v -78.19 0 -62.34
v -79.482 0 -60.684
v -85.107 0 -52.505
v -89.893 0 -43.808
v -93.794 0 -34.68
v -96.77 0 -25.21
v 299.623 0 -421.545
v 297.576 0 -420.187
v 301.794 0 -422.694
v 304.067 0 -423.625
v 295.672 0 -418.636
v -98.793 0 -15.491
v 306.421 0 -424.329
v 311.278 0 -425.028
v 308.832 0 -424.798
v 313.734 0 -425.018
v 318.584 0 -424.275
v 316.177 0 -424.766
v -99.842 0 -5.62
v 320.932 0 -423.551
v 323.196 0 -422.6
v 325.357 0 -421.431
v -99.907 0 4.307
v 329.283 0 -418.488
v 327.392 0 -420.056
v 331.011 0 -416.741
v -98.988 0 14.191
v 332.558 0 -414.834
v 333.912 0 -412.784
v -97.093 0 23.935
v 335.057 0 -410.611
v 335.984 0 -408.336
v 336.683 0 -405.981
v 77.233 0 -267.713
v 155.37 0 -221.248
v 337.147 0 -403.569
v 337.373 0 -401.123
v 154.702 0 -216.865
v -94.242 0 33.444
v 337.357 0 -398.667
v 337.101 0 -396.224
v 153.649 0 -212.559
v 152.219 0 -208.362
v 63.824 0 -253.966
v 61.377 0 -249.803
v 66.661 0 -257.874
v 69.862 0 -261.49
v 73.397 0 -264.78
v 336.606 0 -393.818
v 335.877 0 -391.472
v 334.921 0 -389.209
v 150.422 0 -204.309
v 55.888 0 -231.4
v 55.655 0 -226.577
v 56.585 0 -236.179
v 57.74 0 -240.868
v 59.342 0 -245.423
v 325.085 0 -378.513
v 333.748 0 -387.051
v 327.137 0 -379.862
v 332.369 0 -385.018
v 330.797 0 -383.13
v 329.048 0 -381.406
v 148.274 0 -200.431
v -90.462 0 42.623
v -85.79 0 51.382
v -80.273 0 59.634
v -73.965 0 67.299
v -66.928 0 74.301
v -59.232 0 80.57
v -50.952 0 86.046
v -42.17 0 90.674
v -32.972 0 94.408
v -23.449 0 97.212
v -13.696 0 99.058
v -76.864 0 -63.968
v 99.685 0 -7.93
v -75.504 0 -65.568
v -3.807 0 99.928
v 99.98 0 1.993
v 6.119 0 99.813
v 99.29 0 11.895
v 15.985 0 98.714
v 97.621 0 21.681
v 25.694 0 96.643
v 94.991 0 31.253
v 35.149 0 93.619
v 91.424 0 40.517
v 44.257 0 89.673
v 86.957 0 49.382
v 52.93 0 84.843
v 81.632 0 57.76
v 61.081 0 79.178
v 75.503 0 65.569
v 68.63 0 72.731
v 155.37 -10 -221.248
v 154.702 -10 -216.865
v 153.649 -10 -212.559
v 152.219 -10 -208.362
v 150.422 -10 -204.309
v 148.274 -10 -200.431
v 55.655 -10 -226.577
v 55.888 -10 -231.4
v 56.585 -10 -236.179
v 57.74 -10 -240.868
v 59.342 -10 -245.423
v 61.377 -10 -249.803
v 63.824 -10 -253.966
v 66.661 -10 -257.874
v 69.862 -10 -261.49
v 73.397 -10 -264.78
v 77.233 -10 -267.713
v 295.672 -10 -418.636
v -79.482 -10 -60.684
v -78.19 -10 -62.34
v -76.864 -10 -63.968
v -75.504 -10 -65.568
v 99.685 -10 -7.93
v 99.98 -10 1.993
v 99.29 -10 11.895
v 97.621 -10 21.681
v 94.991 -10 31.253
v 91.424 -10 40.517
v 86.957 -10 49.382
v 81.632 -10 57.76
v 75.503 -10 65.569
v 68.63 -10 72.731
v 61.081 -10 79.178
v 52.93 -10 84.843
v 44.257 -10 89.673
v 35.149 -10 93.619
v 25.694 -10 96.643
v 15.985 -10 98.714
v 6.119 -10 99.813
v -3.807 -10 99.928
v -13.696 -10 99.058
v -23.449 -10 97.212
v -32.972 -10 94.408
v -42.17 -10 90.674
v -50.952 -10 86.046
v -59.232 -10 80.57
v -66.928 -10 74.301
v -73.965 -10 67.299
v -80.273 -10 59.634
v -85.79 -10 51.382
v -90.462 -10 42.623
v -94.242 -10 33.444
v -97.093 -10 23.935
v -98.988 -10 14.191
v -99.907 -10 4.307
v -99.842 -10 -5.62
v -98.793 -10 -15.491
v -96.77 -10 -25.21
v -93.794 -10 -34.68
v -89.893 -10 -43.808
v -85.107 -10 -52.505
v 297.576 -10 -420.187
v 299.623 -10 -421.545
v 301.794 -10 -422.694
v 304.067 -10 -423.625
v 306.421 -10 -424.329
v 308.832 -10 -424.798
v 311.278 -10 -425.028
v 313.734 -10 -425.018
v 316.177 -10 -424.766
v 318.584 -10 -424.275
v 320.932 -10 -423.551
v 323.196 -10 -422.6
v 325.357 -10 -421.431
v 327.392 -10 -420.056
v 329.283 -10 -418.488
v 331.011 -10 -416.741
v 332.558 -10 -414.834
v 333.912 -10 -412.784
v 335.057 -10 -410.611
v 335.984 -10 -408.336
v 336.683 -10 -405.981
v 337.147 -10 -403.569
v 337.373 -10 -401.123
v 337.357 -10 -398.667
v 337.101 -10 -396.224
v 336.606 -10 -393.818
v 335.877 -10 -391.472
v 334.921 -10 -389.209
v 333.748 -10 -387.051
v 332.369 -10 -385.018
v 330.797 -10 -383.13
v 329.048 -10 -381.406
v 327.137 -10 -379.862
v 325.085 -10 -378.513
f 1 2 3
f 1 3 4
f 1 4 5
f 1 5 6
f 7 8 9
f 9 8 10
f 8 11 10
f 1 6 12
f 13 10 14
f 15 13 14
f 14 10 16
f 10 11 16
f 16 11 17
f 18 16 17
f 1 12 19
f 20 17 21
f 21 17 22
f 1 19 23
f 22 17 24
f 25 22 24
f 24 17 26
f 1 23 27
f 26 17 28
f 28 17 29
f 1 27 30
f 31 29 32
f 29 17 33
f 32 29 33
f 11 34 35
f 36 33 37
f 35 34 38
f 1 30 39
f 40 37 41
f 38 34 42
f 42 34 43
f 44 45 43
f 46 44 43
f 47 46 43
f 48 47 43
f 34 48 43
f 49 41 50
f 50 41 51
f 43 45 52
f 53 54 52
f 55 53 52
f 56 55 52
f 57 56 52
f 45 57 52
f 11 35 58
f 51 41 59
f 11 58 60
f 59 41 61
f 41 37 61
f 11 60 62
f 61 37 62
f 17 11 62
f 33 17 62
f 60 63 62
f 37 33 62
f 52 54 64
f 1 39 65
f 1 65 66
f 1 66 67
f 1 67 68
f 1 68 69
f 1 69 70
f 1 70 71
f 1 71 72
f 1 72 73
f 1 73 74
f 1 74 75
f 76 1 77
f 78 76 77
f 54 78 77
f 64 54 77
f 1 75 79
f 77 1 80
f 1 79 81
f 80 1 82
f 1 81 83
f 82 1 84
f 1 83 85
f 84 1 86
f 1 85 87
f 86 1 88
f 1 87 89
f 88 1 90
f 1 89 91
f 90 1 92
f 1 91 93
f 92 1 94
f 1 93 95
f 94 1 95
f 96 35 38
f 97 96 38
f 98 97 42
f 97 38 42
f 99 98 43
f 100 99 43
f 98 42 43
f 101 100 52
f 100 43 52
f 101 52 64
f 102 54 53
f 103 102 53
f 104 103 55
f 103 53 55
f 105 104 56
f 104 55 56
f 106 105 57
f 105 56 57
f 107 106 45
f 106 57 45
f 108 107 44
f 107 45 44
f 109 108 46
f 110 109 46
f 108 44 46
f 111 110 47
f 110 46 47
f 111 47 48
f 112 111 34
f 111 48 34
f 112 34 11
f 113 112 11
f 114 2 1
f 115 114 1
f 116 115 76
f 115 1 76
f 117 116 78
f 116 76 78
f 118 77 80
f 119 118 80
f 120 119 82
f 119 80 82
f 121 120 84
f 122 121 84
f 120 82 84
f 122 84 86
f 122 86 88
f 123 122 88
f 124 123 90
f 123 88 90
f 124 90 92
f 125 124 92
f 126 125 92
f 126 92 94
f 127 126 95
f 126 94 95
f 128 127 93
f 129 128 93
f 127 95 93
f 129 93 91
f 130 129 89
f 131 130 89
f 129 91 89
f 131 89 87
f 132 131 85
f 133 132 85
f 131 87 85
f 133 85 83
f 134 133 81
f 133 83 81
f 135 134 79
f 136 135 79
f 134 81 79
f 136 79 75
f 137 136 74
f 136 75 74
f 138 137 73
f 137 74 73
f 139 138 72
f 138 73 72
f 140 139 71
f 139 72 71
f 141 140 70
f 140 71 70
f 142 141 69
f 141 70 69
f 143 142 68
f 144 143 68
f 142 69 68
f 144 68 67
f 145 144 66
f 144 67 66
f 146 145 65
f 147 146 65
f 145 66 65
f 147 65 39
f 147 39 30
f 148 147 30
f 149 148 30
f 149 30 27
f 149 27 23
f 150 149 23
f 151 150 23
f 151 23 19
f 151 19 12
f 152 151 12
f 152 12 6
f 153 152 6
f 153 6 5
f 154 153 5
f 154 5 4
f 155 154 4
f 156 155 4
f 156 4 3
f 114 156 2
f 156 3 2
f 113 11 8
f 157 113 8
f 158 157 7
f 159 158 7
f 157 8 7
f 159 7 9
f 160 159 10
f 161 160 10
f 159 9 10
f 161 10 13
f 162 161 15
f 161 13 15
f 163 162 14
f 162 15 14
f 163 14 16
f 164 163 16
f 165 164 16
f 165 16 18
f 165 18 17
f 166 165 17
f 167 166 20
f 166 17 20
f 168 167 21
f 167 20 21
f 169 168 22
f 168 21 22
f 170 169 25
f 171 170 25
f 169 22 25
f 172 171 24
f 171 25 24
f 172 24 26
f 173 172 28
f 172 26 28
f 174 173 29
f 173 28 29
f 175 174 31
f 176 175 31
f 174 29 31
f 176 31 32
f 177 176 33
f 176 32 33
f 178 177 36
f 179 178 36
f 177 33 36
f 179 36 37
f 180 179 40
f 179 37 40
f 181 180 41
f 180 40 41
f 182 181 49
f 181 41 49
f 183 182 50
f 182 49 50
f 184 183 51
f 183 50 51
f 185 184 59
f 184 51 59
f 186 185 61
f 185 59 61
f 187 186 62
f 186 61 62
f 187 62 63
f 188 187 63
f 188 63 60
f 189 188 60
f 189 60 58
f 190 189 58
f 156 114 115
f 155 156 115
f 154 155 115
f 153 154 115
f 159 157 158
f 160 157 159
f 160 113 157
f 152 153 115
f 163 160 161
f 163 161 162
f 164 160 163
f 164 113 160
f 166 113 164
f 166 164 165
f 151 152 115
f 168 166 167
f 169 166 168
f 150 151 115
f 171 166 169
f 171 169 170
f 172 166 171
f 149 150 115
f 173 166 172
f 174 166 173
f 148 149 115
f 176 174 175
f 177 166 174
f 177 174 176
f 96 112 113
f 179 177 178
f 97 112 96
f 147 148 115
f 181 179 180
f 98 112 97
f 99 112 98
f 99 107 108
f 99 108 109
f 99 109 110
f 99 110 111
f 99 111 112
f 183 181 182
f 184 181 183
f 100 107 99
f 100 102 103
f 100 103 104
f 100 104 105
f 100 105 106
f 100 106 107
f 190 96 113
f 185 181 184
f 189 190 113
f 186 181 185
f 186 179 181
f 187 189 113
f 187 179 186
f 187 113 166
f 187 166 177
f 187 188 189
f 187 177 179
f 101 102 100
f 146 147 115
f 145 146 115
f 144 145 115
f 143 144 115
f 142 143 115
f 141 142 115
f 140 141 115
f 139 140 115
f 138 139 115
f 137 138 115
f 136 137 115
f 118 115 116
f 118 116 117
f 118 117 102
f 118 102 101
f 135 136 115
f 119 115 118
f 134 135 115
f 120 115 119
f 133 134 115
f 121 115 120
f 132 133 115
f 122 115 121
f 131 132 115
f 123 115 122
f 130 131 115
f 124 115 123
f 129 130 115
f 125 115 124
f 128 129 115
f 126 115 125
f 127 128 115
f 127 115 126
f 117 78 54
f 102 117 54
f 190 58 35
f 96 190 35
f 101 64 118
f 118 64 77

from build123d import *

# Parameters (mm, degrees)
F1_DEPTH = 10


with BuildPart() as f1:
    # F0 (on Front) → F1 (new body)
    with BuildSketch(Plane.XZ):
        with BuildLine():
            Line((148.27354, -200.430762), (99.685095, -7.929801))
            ThreePointArc((99.685095, -7.929801), (-28.245338, 95.928103), (-79.482166, -60.684308))
            Line((-79.482166, -60.684308), (-75.50395, -65.567931))
            Line((-75.50395, -65.567931), (55.654565, -226.576947))
            ThreePointArc((55.654565, -226.576947), (61.376545, -249.803158), (77.232841, -267.713373))
            Line((77.232841, -267.713373), (295.671613, -418.635733))
            ThreePointArc((295.671613, -418.635733), (332.558426, -414.834083), (325.084536, -378.51287))
            Line((325.084536, -378.51287), (155.36982, -221.248394))
            ThreePointArc((155.36982, -221.248394), (152.980519, -210.444555), (148.27354, -200.430762))
        make_face()
        with BuildLine():
            Line((-75.50395, -65.567931), (-79.482166, -60.684308))
            ThreePointArc((-79.482166, -60.684308), (-77.531519, -63.15745), (-75.50395, -65.567931))
        make_face()
    extrude(amount=F1_DEPTH)


solid = f1.part
